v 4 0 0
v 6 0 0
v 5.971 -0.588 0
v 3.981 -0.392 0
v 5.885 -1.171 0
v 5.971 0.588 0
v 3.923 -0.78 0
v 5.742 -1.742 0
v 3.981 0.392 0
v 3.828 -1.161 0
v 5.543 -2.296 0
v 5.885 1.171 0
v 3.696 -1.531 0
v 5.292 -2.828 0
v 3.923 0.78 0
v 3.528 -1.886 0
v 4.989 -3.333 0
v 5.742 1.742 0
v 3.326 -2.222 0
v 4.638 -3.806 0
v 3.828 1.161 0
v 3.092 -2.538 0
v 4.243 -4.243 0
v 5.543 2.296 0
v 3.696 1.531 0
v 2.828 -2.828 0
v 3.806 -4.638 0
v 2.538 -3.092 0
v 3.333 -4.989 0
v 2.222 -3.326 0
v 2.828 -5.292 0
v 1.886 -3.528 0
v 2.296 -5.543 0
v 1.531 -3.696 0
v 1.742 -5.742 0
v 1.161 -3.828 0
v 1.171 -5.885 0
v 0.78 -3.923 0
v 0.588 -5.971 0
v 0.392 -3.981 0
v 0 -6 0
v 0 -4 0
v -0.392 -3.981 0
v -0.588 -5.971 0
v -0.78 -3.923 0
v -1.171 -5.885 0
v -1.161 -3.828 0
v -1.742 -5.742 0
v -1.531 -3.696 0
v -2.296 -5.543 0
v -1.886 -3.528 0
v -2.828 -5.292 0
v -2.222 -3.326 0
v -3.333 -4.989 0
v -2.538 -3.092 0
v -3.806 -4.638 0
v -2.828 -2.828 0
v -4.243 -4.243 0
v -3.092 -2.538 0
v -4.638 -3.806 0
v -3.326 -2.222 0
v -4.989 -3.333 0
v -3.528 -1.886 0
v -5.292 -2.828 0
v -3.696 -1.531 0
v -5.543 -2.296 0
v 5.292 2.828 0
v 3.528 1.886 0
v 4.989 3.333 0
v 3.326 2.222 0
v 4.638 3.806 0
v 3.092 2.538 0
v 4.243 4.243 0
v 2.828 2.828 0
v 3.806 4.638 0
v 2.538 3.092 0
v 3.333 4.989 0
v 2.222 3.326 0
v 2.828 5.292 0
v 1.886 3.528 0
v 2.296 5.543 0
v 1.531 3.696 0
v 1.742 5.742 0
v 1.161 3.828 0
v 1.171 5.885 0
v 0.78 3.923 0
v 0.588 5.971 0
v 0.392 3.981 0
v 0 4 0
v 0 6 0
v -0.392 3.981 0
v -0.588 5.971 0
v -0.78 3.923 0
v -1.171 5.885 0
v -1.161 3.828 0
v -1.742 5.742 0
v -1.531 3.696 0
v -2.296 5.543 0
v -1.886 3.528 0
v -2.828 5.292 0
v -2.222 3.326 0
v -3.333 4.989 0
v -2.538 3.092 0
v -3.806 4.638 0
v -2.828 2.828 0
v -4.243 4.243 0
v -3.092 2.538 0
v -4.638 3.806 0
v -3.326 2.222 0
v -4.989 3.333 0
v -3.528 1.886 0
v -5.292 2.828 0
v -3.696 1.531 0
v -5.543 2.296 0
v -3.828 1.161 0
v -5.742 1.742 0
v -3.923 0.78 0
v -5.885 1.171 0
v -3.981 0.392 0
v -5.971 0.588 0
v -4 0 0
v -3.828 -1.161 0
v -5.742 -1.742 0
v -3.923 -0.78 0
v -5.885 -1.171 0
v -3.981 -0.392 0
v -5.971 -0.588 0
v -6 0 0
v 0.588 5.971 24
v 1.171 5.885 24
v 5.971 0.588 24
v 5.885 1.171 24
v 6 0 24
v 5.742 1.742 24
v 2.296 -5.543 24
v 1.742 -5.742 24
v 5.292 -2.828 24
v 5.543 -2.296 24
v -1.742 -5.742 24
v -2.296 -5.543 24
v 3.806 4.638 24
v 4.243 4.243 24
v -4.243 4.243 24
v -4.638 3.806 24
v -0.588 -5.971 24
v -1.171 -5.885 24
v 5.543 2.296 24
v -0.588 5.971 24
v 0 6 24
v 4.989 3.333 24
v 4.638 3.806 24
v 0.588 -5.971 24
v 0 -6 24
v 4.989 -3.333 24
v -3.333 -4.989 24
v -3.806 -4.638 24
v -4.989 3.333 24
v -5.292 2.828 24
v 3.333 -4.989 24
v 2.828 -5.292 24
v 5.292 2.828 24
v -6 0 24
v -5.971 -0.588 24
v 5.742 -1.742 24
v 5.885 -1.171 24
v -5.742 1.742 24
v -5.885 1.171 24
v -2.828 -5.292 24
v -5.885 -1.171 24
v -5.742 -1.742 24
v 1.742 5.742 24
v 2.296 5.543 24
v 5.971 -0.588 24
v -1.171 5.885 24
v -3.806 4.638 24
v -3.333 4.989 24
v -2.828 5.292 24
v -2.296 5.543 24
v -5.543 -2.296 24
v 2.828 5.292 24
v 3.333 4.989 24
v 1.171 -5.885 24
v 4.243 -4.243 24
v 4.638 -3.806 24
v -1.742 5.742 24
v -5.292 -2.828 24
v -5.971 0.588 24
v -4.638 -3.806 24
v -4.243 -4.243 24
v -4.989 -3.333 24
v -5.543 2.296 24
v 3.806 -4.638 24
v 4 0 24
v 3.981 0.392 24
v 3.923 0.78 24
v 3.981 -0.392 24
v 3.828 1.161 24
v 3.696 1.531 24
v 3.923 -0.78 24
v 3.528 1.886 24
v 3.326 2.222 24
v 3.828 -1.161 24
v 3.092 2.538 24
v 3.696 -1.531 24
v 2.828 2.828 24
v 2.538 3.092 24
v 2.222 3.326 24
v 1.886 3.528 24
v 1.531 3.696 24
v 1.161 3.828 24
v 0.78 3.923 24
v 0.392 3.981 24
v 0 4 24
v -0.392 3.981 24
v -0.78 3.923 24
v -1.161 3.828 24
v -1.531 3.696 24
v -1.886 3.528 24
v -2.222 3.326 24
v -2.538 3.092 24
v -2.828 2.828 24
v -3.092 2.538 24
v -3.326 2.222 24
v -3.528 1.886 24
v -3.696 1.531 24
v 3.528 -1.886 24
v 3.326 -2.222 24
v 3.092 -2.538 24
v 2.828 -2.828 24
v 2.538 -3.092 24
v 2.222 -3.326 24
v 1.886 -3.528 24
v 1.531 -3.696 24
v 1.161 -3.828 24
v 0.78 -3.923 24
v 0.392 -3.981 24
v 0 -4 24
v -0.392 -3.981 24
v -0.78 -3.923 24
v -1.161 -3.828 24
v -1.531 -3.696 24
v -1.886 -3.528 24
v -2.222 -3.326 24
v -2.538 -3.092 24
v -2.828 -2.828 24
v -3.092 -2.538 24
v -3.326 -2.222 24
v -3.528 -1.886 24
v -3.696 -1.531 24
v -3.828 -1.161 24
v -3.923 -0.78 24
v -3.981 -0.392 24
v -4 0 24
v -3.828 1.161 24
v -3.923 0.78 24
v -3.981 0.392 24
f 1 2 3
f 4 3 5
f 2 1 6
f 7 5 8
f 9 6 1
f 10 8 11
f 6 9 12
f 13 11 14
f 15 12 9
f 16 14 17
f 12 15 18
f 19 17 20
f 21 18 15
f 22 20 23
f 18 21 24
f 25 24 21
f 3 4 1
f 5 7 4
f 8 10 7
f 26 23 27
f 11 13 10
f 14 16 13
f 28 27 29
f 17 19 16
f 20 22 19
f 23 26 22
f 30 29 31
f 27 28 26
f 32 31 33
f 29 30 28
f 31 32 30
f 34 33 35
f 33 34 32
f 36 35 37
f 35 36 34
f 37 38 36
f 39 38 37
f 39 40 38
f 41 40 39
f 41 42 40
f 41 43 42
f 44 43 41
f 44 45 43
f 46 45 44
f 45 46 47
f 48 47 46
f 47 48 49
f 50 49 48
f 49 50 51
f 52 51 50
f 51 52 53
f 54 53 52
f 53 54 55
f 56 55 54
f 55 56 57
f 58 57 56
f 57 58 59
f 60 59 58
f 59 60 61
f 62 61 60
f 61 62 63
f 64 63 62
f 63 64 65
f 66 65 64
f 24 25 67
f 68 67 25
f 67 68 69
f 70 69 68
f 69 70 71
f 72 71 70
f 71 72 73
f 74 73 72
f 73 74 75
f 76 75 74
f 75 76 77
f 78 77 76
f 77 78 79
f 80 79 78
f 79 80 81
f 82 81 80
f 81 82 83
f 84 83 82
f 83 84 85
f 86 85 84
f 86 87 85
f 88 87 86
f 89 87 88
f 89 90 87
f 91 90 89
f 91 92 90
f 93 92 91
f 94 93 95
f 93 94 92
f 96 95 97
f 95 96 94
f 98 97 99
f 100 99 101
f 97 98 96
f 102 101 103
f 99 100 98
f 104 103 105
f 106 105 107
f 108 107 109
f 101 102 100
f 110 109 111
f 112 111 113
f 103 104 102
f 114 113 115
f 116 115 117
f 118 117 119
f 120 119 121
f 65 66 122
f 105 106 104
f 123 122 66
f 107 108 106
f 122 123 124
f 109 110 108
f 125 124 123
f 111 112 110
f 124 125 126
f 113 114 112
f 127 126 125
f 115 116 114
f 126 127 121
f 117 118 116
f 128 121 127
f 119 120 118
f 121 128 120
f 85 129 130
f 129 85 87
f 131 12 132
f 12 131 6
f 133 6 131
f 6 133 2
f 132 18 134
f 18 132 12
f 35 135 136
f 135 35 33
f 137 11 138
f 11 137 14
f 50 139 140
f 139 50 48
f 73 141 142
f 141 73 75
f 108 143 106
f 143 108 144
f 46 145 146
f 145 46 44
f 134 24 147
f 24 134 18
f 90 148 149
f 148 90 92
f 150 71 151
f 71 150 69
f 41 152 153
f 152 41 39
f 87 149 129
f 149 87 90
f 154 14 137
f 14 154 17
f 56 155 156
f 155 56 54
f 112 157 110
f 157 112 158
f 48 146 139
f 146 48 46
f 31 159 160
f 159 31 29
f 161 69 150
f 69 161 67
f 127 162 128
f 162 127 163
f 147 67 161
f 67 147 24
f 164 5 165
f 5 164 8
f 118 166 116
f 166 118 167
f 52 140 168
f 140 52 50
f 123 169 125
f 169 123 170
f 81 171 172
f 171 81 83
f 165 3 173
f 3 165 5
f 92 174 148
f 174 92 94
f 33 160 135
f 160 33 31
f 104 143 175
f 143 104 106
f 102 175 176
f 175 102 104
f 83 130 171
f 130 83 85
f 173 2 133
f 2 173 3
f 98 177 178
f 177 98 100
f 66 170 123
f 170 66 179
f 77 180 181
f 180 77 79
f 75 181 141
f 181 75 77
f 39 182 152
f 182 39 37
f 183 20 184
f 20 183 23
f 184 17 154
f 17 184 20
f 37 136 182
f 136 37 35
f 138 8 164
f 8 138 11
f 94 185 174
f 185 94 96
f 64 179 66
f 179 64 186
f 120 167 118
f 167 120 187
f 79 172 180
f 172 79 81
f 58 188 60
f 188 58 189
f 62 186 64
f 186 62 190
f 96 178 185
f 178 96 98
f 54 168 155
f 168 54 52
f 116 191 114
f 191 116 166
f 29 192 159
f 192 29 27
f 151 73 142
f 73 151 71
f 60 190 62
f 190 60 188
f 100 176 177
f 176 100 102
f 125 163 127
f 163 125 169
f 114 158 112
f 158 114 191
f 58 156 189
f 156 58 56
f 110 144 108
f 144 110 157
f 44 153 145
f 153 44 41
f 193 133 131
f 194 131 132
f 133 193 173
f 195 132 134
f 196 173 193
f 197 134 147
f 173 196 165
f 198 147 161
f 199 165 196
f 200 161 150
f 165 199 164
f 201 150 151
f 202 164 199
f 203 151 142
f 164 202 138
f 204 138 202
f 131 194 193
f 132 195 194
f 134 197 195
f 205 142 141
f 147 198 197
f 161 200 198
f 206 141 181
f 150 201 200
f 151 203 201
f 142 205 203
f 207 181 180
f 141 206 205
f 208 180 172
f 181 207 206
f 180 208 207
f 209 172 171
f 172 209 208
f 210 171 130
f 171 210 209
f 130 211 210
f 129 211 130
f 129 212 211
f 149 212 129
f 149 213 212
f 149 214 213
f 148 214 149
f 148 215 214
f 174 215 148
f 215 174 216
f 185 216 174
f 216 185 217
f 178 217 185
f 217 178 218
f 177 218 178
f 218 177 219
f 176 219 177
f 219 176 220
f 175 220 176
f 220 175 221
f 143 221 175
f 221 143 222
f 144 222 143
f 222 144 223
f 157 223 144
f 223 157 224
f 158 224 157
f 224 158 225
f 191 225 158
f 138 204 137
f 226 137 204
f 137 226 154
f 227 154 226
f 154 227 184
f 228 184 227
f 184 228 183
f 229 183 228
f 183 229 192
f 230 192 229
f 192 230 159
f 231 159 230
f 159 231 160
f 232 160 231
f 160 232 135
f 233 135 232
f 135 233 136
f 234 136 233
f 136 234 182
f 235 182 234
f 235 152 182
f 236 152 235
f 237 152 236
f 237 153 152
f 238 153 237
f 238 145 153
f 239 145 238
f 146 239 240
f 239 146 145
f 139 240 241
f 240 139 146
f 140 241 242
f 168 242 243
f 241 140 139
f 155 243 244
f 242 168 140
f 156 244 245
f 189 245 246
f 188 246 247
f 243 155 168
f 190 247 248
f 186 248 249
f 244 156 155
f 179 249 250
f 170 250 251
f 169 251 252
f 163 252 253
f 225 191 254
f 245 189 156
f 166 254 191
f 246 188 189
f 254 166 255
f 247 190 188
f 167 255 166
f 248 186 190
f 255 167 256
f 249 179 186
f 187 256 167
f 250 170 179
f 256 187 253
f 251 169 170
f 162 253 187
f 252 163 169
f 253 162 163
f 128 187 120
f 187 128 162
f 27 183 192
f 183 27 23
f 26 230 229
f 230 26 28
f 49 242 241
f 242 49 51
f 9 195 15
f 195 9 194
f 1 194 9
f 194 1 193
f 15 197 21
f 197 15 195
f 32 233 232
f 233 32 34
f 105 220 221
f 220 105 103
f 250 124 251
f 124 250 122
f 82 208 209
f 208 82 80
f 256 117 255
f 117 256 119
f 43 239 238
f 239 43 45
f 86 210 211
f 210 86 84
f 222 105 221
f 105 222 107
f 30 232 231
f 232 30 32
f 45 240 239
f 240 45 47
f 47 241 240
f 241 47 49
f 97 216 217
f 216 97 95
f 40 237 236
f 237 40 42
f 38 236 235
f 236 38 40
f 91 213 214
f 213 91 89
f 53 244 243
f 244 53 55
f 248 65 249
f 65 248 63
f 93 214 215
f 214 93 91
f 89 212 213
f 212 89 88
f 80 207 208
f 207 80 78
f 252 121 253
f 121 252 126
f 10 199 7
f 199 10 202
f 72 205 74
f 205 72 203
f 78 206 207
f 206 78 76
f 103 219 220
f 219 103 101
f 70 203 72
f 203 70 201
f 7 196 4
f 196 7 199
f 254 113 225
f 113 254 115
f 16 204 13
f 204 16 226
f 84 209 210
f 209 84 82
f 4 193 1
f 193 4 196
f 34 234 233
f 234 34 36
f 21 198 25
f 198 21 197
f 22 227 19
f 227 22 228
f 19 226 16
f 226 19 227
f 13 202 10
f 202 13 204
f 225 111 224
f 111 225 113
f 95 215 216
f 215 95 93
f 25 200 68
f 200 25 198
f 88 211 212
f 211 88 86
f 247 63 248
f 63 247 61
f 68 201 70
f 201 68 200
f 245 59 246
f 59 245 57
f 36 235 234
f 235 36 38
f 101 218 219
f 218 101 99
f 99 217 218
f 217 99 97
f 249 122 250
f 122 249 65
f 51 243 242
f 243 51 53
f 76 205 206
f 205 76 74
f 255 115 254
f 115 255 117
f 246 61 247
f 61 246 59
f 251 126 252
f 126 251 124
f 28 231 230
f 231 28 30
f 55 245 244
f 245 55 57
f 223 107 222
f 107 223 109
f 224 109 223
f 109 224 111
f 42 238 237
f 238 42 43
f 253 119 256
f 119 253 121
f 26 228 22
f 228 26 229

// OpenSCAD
// Hose-barb reducer - joins two silicone tube bore sizes with a through-bore. The two barb
// sections have a sawtooth outer profile (a NOVEL shape not in any benchmark).
//

tube_bore   = 8;
tube_bore2  = 5;
barb_height = 10;
barb_height2 = 8;
collar      = 12;
length      = 20;
length2     = 8;
step        = 2;

$fn = 64;

od1_bottom = 7.5;
od1_top    = 9.5;
od2_bottom = 6.5;
od2_top    = 5.0;

difference() {
    union() {
        for (z = [0, length])
            for (od = [od1_bottom, od1_top])
                cylinder(h = barb_height, d = od);
        for (z = [length, length + length2])
            for (od = [od2_bottom, od2_top])
                cylinder(h = barb_height2, d = od);
        cylinder(h = length2 + 16, d = collar);
    }
    translate([0, 0, -1]) cylinder(h = length + length2 + 2, d = tube_bore);
    translate([0, 0, length + length2 + 1]) cylinder(h = length + length2 + 2, d = tube_bore2);
}
